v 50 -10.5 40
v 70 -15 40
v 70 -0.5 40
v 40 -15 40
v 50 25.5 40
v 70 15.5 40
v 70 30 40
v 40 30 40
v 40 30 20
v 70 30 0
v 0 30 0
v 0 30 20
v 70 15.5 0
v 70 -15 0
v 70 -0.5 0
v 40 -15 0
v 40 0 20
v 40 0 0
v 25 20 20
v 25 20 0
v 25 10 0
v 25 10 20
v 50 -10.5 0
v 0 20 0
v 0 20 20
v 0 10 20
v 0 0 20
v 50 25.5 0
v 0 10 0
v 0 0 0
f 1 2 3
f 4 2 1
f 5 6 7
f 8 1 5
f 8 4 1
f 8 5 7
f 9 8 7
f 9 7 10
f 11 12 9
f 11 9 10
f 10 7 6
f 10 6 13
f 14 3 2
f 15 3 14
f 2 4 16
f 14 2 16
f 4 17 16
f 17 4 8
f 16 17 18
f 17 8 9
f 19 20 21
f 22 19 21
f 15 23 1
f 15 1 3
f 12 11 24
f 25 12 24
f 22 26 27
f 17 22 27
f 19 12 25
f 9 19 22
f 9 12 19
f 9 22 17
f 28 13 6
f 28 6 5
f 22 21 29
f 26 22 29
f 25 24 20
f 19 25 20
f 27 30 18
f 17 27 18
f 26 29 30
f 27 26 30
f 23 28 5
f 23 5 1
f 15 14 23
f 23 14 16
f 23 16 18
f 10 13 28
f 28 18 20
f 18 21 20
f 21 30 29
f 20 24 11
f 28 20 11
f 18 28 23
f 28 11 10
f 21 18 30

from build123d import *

# Parameters (mm, degrees)
AUFSATZ_LINEAR_AUSTRAGEN1_DEPTH      = 20
SKIZZE2_W                            = 40
SKIZZE2_H                            = 45
AUFSATZ_LINEAR_AUSTRAGEN3_DEPTH      = 30
SCHNITT_LINEAR_AUSTRAGEN1_DEPTH      = 87.02325267
SCHNITT_LINEAR_AUSTRAGEN1_DEPTH_BACK = 40


with BuildPart() as part:
    # Skizze1 → Aufsatz-Linear austragen1 (new body)
    with BuildSketch(Plane.XY):
        Polygon((0, 0), (40, 0), (40, 30), (0, 30), (0, 20), (25, 20), (25, 10), (0, 10), align=None)
    extrude(amount=AUFSATZ_LINEAR_AUSTRAGEN1_DEPTH)

    # Skizze2 → Aufsatz-Linear austragen3 (add)
    with BuildSketch(Plane(origin=(40, 0, 0), x_dir=(0, 0, -1), z_dir=(1, 0, 0))):
        with Locations((-20, 7.5)):
            Rectangle(SKIZZE2_W, SKIZZE2_H)
    extrude(amount=AUFSATZ_LINEAR_AUSTRAGEN3_DEPTH)

    # Skizze3 → Schnitt-Linear austragen1 (cut, two sides: drawn at the far end of the back side and taken through both)
    with BuildSketch(Plane.XY.offset(40).offset(-SCHNITT_LINEAR_AUSTRAGEN1_DEPTH_BACK)):
        Polygon((215.534169047, -57.267084524), (70, 15.5), (50, 25.5), (50, -10.5), (70, -0.5), (215.534169047, 72.267084524), (-109.890125992, 72.267084524), (-109.890125992, -57.267084524), align=None)
    extrude(amount=SCHNITT_LINEAR_AUSTRAGEN1_DEPTH + SCHNITT_LINEAR_AUSTRAGEN1_DEPTH_BACK, mode=Mode.SUBTRACT)


solid = part.part
